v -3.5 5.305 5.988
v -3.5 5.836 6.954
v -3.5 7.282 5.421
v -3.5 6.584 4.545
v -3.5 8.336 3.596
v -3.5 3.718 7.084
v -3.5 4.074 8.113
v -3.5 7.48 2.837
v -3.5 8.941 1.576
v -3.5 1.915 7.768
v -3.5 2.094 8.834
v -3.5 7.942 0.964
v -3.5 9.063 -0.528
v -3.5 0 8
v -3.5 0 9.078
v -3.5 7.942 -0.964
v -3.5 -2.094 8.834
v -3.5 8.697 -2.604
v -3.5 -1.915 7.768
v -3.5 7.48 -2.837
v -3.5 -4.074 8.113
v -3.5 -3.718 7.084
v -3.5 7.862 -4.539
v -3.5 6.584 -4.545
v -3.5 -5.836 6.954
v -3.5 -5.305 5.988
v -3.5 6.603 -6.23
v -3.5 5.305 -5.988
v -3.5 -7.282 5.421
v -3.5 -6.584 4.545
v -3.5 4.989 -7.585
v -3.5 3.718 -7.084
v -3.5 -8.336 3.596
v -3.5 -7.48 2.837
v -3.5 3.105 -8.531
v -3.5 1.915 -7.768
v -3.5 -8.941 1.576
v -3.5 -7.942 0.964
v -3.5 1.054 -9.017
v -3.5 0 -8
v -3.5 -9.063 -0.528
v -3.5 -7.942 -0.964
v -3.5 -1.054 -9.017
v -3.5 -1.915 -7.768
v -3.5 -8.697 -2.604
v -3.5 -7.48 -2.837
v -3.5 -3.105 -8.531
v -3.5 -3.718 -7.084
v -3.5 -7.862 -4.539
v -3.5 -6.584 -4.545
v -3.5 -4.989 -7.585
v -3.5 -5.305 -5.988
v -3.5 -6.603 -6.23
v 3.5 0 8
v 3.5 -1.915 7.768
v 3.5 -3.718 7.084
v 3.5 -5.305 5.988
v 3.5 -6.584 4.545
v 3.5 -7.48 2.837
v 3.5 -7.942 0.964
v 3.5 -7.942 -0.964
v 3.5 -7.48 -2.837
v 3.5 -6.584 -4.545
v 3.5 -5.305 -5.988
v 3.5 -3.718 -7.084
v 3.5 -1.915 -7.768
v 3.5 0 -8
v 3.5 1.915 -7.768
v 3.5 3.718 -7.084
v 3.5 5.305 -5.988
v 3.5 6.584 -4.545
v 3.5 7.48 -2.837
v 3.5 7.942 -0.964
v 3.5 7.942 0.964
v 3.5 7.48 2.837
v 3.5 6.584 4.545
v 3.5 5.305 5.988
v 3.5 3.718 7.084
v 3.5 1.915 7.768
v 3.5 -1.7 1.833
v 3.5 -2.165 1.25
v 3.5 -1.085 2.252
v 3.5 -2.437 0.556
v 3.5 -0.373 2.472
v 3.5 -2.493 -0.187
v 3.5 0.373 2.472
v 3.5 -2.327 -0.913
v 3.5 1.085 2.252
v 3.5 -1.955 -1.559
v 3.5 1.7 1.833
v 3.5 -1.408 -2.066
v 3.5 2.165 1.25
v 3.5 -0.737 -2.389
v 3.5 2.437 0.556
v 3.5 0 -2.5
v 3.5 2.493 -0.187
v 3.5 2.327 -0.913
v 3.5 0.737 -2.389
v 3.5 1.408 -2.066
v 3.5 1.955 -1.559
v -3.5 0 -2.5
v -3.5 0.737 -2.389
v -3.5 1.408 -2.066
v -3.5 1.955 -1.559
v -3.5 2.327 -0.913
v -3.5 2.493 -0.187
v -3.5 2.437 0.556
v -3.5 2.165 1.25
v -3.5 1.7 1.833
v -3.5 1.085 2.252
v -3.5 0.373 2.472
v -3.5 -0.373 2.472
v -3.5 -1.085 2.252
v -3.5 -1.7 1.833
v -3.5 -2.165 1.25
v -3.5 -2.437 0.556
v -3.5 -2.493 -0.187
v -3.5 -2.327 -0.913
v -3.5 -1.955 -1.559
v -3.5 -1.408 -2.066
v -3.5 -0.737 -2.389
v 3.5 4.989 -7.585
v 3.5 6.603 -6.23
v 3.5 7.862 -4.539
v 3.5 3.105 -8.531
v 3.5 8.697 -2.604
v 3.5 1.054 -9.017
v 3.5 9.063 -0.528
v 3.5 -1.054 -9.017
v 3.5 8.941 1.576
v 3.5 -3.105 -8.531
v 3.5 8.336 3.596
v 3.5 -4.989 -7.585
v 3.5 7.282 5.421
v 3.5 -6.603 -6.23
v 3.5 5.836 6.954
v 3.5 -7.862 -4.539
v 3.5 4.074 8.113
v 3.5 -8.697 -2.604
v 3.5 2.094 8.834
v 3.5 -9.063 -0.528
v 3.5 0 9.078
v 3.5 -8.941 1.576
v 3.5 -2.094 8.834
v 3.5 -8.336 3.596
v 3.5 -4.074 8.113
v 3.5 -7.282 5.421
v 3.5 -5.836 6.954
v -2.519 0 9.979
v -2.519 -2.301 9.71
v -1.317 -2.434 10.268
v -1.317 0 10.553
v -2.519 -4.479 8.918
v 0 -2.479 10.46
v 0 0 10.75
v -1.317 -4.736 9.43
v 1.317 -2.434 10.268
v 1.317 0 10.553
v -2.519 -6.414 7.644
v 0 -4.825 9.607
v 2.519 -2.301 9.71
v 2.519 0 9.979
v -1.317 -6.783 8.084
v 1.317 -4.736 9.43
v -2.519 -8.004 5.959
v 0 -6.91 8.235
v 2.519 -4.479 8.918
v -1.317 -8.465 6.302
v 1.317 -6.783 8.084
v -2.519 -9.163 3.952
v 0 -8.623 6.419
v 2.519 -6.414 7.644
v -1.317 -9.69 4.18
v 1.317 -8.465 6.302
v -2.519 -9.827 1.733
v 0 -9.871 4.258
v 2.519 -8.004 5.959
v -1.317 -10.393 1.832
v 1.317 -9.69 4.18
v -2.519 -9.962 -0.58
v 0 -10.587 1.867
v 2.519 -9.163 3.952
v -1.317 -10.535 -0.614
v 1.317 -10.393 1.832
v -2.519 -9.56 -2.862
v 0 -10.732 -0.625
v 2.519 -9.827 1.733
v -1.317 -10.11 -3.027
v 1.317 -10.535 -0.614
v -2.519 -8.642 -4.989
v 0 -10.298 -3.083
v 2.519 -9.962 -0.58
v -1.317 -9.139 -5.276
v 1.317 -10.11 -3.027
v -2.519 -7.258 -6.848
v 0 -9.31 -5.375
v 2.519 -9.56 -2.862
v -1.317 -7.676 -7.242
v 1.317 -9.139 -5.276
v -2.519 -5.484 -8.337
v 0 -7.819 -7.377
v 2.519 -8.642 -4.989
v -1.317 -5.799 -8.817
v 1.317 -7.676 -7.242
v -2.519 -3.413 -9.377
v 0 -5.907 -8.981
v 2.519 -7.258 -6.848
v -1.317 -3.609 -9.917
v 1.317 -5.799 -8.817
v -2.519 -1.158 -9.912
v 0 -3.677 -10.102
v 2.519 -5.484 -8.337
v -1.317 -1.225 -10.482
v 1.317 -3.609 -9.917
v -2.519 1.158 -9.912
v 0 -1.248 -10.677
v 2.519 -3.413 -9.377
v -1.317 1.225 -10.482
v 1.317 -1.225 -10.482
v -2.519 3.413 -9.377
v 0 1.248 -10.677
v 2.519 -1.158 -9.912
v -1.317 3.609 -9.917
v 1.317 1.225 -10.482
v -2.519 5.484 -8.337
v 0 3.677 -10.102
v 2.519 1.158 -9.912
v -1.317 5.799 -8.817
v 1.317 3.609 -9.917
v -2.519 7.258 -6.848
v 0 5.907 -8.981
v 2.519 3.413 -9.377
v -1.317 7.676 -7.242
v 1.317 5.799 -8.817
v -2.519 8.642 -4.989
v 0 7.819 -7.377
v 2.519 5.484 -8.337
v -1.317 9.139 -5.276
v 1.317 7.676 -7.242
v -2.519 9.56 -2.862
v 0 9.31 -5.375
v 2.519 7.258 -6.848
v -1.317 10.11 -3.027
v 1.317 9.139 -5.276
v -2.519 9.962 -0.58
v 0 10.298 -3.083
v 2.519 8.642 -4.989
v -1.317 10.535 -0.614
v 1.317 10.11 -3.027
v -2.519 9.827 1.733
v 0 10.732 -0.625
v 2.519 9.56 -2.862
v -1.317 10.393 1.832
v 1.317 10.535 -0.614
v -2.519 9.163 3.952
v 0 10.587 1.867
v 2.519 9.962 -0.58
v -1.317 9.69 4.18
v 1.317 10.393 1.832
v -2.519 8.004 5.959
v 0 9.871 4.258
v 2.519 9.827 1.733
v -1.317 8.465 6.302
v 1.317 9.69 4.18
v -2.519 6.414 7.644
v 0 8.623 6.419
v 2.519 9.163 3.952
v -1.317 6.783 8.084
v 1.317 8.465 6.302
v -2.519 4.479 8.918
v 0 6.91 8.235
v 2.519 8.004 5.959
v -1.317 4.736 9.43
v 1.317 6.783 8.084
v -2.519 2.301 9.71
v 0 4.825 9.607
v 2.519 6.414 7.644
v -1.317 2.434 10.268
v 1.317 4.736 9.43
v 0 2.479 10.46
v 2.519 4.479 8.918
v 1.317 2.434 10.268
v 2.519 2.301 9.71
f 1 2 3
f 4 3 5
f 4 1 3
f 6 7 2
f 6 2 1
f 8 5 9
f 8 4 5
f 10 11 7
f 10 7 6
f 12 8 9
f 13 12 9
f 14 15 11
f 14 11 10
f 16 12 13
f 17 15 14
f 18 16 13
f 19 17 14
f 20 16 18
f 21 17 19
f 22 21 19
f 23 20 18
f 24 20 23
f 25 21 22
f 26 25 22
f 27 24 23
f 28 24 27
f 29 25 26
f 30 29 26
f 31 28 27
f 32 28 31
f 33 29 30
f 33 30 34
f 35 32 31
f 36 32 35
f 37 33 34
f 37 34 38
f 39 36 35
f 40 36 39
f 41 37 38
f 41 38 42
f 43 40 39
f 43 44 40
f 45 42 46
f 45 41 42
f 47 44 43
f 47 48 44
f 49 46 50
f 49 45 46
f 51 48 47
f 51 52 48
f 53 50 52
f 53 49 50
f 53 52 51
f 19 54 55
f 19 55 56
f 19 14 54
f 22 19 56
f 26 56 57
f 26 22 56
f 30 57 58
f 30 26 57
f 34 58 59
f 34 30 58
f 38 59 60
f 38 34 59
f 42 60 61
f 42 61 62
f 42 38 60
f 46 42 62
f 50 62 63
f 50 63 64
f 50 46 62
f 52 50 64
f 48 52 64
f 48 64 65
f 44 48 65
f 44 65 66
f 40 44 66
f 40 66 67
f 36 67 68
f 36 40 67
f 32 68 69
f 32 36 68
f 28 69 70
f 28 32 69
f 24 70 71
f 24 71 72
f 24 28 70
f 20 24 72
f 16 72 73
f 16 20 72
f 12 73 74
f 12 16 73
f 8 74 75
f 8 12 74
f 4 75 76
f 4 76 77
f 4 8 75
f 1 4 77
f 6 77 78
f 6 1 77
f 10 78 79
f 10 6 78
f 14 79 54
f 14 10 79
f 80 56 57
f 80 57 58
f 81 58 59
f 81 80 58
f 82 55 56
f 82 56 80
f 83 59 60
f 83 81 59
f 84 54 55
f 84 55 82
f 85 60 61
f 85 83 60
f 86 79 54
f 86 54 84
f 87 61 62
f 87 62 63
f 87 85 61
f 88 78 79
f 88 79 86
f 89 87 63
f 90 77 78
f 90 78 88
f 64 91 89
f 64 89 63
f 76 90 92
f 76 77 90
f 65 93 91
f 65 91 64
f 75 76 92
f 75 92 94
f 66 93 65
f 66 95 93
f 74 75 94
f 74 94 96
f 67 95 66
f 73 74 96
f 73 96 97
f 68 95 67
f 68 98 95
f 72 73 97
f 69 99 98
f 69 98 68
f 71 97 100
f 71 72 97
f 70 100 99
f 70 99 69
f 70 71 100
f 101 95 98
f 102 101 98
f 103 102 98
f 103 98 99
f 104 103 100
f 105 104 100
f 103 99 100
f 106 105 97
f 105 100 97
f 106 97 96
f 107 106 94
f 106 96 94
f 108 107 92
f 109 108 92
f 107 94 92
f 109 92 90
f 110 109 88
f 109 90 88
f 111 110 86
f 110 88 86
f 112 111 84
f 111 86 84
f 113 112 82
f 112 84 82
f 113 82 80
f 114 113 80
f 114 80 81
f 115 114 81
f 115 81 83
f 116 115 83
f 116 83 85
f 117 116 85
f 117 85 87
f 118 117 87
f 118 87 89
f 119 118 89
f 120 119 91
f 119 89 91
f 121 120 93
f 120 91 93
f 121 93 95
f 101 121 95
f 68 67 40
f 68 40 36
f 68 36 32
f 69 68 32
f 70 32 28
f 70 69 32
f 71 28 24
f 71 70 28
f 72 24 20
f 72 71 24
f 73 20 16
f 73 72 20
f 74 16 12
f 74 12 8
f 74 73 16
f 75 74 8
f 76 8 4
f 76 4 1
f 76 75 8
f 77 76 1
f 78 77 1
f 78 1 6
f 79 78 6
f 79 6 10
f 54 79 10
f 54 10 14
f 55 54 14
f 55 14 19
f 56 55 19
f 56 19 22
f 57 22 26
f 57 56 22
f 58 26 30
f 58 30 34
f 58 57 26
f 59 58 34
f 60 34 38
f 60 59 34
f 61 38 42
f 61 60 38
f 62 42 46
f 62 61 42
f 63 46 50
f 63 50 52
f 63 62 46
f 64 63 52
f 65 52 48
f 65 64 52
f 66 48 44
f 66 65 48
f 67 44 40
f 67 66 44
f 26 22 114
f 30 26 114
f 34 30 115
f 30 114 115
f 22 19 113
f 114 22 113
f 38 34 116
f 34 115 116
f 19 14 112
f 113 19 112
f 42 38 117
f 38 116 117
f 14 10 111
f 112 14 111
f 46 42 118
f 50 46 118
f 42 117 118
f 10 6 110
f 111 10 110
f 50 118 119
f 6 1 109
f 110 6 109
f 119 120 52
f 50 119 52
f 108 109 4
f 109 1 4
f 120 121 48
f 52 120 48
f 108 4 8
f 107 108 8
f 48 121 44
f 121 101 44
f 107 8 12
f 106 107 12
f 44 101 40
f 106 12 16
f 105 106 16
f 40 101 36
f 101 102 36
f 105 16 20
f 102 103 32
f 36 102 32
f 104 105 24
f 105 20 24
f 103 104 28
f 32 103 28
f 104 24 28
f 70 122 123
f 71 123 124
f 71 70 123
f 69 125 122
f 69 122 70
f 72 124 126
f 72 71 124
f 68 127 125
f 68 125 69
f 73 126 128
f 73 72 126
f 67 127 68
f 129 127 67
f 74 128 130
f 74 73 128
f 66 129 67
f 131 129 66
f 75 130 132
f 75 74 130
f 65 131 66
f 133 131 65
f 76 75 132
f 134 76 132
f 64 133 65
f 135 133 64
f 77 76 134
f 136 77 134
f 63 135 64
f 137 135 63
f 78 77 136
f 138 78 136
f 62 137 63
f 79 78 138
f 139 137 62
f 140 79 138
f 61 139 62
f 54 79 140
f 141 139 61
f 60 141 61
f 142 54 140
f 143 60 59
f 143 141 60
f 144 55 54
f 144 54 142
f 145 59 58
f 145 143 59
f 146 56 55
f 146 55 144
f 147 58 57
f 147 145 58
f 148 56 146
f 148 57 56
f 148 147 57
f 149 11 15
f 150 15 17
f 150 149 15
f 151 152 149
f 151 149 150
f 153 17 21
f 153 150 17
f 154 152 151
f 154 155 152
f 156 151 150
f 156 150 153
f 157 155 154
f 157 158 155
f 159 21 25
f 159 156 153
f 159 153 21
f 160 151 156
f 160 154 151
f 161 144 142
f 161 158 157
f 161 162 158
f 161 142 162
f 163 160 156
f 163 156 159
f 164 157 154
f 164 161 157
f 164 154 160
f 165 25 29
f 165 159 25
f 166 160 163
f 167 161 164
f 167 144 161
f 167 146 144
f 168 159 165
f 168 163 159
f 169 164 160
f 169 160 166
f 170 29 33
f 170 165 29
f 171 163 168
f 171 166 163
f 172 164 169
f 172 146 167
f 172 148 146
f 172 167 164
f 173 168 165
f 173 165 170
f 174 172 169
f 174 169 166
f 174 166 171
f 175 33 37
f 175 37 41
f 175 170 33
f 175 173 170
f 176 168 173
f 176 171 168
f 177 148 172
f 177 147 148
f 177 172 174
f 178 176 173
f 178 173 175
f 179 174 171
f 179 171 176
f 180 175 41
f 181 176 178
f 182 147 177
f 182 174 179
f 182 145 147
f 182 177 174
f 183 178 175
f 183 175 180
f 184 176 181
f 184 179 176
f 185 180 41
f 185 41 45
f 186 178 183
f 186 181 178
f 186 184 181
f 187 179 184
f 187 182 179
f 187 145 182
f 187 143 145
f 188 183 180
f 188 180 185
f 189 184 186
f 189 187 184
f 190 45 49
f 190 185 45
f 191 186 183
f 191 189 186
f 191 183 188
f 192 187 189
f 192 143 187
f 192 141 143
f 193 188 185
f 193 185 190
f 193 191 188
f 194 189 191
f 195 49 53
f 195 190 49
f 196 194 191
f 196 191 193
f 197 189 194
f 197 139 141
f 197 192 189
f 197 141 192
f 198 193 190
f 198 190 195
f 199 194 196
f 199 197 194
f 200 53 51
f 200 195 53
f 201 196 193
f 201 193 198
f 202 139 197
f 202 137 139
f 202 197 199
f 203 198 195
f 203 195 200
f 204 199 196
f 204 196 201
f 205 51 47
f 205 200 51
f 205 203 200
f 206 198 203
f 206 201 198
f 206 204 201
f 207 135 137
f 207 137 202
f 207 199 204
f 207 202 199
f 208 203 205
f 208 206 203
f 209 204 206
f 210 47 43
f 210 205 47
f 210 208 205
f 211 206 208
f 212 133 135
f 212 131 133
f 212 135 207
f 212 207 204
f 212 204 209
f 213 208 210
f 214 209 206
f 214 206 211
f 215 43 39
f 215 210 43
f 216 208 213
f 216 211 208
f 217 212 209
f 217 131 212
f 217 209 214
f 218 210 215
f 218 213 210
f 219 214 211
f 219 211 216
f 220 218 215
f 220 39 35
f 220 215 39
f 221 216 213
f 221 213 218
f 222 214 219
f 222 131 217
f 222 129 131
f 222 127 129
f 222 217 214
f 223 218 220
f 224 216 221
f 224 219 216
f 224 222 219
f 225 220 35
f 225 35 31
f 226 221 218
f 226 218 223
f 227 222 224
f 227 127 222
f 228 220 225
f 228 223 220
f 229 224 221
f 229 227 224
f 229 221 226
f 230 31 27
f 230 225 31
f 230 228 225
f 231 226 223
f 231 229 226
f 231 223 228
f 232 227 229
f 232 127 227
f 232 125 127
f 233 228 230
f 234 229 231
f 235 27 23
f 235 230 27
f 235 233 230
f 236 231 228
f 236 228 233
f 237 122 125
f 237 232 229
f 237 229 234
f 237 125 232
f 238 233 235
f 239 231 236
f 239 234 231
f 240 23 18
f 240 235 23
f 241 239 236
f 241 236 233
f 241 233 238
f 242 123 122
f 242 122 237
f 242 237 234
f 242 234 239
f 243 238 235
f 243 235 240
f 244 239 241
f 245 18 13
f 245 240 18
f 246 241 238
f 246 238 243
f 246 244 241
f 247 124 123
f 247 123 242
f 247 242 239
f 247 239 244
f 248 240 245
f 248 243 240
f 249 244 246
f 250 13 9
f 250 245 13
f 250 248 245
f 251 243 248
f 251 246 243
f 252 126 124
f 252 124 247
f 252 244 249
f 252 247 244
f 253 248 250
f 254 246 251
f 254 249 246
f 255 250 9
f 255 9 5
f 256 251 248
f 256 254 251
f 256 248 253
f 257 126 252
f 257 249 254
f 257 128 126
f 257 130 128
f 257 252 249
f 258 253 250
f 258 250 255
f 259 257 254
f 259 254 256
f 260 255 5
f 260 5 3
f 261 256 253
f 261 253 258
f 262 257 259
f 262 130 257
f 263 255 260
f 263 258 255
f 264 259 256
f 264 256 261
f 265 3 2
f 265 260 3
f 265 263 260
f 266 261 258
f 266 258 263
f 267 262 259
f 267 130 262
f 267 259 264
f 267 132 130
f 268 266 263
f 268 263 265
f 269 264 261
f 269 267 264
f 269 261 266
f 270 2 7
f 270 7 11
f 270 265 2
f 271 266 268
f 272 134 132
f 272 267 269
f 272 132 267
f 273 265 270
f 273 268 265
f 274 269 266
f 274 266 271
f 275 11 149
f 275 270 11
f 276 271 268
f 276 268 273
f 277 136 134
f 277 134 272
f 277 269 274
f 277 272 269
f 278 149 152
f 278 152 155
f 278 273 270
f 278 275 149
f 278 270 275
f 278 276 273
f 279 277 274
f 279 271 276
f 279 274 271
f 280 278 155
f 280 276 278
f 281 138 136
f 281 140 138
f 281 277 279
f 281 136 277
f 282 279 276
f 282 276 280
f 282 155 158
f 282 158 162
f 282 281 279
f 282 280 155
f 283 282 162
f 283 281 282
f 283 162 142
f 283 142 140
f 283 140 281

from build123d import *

# Parameters (mm, degrees)
EXTRUDE_START   = 3.5
SKETCH_3_R      = 8
SKETCH_3_R_2    = 2.5
EXTRUDE_1_DEPTH = 7


with BuildPart() as part:
    # Эскиз2 → Повернуть1 (revolve)
    with BuildSketch(Plane.XY, mode=Mode.PRIVATE) as revolve_1_sk:
        with BuildLine():
            Line((3.5, 8), (-3.5, 8))
            Line((-3.5, 8), (-3.5, 9.078427125))
            ThreePointArc((-3.5, 9.078427125), (0, 10.75), (3.5, 9.078427125))
            Line((3.5, 9.078427125), (3.5, 8))
        make_face()
    revolve(revolve_1_sk.sketch.rotate(Axis((-4.9172806, 0, 0), (1, 0, 0)), 90), axis=Axis((-4.9172806, 0, 0), (1, 0, 0)))


with BuildPart() as body_2:
    # Эскиз3 → Бобышка-Вытянуть1 (new body)
    with BuildSketch(Plane(origin=(0, 0, 0), x_dir=(0, 0, -1), z_dir=(1, 0, 0)).offset(EXTRUDE_START)):
        Circle(SKETCH_3_R)
        Circle(SKETCH_3_R_2, mode=Mode.SUBTRACT)
    extrude(amount=-EXTRUDE_1_DEPTH)


solid = Compound([part.part, body_2.part])
